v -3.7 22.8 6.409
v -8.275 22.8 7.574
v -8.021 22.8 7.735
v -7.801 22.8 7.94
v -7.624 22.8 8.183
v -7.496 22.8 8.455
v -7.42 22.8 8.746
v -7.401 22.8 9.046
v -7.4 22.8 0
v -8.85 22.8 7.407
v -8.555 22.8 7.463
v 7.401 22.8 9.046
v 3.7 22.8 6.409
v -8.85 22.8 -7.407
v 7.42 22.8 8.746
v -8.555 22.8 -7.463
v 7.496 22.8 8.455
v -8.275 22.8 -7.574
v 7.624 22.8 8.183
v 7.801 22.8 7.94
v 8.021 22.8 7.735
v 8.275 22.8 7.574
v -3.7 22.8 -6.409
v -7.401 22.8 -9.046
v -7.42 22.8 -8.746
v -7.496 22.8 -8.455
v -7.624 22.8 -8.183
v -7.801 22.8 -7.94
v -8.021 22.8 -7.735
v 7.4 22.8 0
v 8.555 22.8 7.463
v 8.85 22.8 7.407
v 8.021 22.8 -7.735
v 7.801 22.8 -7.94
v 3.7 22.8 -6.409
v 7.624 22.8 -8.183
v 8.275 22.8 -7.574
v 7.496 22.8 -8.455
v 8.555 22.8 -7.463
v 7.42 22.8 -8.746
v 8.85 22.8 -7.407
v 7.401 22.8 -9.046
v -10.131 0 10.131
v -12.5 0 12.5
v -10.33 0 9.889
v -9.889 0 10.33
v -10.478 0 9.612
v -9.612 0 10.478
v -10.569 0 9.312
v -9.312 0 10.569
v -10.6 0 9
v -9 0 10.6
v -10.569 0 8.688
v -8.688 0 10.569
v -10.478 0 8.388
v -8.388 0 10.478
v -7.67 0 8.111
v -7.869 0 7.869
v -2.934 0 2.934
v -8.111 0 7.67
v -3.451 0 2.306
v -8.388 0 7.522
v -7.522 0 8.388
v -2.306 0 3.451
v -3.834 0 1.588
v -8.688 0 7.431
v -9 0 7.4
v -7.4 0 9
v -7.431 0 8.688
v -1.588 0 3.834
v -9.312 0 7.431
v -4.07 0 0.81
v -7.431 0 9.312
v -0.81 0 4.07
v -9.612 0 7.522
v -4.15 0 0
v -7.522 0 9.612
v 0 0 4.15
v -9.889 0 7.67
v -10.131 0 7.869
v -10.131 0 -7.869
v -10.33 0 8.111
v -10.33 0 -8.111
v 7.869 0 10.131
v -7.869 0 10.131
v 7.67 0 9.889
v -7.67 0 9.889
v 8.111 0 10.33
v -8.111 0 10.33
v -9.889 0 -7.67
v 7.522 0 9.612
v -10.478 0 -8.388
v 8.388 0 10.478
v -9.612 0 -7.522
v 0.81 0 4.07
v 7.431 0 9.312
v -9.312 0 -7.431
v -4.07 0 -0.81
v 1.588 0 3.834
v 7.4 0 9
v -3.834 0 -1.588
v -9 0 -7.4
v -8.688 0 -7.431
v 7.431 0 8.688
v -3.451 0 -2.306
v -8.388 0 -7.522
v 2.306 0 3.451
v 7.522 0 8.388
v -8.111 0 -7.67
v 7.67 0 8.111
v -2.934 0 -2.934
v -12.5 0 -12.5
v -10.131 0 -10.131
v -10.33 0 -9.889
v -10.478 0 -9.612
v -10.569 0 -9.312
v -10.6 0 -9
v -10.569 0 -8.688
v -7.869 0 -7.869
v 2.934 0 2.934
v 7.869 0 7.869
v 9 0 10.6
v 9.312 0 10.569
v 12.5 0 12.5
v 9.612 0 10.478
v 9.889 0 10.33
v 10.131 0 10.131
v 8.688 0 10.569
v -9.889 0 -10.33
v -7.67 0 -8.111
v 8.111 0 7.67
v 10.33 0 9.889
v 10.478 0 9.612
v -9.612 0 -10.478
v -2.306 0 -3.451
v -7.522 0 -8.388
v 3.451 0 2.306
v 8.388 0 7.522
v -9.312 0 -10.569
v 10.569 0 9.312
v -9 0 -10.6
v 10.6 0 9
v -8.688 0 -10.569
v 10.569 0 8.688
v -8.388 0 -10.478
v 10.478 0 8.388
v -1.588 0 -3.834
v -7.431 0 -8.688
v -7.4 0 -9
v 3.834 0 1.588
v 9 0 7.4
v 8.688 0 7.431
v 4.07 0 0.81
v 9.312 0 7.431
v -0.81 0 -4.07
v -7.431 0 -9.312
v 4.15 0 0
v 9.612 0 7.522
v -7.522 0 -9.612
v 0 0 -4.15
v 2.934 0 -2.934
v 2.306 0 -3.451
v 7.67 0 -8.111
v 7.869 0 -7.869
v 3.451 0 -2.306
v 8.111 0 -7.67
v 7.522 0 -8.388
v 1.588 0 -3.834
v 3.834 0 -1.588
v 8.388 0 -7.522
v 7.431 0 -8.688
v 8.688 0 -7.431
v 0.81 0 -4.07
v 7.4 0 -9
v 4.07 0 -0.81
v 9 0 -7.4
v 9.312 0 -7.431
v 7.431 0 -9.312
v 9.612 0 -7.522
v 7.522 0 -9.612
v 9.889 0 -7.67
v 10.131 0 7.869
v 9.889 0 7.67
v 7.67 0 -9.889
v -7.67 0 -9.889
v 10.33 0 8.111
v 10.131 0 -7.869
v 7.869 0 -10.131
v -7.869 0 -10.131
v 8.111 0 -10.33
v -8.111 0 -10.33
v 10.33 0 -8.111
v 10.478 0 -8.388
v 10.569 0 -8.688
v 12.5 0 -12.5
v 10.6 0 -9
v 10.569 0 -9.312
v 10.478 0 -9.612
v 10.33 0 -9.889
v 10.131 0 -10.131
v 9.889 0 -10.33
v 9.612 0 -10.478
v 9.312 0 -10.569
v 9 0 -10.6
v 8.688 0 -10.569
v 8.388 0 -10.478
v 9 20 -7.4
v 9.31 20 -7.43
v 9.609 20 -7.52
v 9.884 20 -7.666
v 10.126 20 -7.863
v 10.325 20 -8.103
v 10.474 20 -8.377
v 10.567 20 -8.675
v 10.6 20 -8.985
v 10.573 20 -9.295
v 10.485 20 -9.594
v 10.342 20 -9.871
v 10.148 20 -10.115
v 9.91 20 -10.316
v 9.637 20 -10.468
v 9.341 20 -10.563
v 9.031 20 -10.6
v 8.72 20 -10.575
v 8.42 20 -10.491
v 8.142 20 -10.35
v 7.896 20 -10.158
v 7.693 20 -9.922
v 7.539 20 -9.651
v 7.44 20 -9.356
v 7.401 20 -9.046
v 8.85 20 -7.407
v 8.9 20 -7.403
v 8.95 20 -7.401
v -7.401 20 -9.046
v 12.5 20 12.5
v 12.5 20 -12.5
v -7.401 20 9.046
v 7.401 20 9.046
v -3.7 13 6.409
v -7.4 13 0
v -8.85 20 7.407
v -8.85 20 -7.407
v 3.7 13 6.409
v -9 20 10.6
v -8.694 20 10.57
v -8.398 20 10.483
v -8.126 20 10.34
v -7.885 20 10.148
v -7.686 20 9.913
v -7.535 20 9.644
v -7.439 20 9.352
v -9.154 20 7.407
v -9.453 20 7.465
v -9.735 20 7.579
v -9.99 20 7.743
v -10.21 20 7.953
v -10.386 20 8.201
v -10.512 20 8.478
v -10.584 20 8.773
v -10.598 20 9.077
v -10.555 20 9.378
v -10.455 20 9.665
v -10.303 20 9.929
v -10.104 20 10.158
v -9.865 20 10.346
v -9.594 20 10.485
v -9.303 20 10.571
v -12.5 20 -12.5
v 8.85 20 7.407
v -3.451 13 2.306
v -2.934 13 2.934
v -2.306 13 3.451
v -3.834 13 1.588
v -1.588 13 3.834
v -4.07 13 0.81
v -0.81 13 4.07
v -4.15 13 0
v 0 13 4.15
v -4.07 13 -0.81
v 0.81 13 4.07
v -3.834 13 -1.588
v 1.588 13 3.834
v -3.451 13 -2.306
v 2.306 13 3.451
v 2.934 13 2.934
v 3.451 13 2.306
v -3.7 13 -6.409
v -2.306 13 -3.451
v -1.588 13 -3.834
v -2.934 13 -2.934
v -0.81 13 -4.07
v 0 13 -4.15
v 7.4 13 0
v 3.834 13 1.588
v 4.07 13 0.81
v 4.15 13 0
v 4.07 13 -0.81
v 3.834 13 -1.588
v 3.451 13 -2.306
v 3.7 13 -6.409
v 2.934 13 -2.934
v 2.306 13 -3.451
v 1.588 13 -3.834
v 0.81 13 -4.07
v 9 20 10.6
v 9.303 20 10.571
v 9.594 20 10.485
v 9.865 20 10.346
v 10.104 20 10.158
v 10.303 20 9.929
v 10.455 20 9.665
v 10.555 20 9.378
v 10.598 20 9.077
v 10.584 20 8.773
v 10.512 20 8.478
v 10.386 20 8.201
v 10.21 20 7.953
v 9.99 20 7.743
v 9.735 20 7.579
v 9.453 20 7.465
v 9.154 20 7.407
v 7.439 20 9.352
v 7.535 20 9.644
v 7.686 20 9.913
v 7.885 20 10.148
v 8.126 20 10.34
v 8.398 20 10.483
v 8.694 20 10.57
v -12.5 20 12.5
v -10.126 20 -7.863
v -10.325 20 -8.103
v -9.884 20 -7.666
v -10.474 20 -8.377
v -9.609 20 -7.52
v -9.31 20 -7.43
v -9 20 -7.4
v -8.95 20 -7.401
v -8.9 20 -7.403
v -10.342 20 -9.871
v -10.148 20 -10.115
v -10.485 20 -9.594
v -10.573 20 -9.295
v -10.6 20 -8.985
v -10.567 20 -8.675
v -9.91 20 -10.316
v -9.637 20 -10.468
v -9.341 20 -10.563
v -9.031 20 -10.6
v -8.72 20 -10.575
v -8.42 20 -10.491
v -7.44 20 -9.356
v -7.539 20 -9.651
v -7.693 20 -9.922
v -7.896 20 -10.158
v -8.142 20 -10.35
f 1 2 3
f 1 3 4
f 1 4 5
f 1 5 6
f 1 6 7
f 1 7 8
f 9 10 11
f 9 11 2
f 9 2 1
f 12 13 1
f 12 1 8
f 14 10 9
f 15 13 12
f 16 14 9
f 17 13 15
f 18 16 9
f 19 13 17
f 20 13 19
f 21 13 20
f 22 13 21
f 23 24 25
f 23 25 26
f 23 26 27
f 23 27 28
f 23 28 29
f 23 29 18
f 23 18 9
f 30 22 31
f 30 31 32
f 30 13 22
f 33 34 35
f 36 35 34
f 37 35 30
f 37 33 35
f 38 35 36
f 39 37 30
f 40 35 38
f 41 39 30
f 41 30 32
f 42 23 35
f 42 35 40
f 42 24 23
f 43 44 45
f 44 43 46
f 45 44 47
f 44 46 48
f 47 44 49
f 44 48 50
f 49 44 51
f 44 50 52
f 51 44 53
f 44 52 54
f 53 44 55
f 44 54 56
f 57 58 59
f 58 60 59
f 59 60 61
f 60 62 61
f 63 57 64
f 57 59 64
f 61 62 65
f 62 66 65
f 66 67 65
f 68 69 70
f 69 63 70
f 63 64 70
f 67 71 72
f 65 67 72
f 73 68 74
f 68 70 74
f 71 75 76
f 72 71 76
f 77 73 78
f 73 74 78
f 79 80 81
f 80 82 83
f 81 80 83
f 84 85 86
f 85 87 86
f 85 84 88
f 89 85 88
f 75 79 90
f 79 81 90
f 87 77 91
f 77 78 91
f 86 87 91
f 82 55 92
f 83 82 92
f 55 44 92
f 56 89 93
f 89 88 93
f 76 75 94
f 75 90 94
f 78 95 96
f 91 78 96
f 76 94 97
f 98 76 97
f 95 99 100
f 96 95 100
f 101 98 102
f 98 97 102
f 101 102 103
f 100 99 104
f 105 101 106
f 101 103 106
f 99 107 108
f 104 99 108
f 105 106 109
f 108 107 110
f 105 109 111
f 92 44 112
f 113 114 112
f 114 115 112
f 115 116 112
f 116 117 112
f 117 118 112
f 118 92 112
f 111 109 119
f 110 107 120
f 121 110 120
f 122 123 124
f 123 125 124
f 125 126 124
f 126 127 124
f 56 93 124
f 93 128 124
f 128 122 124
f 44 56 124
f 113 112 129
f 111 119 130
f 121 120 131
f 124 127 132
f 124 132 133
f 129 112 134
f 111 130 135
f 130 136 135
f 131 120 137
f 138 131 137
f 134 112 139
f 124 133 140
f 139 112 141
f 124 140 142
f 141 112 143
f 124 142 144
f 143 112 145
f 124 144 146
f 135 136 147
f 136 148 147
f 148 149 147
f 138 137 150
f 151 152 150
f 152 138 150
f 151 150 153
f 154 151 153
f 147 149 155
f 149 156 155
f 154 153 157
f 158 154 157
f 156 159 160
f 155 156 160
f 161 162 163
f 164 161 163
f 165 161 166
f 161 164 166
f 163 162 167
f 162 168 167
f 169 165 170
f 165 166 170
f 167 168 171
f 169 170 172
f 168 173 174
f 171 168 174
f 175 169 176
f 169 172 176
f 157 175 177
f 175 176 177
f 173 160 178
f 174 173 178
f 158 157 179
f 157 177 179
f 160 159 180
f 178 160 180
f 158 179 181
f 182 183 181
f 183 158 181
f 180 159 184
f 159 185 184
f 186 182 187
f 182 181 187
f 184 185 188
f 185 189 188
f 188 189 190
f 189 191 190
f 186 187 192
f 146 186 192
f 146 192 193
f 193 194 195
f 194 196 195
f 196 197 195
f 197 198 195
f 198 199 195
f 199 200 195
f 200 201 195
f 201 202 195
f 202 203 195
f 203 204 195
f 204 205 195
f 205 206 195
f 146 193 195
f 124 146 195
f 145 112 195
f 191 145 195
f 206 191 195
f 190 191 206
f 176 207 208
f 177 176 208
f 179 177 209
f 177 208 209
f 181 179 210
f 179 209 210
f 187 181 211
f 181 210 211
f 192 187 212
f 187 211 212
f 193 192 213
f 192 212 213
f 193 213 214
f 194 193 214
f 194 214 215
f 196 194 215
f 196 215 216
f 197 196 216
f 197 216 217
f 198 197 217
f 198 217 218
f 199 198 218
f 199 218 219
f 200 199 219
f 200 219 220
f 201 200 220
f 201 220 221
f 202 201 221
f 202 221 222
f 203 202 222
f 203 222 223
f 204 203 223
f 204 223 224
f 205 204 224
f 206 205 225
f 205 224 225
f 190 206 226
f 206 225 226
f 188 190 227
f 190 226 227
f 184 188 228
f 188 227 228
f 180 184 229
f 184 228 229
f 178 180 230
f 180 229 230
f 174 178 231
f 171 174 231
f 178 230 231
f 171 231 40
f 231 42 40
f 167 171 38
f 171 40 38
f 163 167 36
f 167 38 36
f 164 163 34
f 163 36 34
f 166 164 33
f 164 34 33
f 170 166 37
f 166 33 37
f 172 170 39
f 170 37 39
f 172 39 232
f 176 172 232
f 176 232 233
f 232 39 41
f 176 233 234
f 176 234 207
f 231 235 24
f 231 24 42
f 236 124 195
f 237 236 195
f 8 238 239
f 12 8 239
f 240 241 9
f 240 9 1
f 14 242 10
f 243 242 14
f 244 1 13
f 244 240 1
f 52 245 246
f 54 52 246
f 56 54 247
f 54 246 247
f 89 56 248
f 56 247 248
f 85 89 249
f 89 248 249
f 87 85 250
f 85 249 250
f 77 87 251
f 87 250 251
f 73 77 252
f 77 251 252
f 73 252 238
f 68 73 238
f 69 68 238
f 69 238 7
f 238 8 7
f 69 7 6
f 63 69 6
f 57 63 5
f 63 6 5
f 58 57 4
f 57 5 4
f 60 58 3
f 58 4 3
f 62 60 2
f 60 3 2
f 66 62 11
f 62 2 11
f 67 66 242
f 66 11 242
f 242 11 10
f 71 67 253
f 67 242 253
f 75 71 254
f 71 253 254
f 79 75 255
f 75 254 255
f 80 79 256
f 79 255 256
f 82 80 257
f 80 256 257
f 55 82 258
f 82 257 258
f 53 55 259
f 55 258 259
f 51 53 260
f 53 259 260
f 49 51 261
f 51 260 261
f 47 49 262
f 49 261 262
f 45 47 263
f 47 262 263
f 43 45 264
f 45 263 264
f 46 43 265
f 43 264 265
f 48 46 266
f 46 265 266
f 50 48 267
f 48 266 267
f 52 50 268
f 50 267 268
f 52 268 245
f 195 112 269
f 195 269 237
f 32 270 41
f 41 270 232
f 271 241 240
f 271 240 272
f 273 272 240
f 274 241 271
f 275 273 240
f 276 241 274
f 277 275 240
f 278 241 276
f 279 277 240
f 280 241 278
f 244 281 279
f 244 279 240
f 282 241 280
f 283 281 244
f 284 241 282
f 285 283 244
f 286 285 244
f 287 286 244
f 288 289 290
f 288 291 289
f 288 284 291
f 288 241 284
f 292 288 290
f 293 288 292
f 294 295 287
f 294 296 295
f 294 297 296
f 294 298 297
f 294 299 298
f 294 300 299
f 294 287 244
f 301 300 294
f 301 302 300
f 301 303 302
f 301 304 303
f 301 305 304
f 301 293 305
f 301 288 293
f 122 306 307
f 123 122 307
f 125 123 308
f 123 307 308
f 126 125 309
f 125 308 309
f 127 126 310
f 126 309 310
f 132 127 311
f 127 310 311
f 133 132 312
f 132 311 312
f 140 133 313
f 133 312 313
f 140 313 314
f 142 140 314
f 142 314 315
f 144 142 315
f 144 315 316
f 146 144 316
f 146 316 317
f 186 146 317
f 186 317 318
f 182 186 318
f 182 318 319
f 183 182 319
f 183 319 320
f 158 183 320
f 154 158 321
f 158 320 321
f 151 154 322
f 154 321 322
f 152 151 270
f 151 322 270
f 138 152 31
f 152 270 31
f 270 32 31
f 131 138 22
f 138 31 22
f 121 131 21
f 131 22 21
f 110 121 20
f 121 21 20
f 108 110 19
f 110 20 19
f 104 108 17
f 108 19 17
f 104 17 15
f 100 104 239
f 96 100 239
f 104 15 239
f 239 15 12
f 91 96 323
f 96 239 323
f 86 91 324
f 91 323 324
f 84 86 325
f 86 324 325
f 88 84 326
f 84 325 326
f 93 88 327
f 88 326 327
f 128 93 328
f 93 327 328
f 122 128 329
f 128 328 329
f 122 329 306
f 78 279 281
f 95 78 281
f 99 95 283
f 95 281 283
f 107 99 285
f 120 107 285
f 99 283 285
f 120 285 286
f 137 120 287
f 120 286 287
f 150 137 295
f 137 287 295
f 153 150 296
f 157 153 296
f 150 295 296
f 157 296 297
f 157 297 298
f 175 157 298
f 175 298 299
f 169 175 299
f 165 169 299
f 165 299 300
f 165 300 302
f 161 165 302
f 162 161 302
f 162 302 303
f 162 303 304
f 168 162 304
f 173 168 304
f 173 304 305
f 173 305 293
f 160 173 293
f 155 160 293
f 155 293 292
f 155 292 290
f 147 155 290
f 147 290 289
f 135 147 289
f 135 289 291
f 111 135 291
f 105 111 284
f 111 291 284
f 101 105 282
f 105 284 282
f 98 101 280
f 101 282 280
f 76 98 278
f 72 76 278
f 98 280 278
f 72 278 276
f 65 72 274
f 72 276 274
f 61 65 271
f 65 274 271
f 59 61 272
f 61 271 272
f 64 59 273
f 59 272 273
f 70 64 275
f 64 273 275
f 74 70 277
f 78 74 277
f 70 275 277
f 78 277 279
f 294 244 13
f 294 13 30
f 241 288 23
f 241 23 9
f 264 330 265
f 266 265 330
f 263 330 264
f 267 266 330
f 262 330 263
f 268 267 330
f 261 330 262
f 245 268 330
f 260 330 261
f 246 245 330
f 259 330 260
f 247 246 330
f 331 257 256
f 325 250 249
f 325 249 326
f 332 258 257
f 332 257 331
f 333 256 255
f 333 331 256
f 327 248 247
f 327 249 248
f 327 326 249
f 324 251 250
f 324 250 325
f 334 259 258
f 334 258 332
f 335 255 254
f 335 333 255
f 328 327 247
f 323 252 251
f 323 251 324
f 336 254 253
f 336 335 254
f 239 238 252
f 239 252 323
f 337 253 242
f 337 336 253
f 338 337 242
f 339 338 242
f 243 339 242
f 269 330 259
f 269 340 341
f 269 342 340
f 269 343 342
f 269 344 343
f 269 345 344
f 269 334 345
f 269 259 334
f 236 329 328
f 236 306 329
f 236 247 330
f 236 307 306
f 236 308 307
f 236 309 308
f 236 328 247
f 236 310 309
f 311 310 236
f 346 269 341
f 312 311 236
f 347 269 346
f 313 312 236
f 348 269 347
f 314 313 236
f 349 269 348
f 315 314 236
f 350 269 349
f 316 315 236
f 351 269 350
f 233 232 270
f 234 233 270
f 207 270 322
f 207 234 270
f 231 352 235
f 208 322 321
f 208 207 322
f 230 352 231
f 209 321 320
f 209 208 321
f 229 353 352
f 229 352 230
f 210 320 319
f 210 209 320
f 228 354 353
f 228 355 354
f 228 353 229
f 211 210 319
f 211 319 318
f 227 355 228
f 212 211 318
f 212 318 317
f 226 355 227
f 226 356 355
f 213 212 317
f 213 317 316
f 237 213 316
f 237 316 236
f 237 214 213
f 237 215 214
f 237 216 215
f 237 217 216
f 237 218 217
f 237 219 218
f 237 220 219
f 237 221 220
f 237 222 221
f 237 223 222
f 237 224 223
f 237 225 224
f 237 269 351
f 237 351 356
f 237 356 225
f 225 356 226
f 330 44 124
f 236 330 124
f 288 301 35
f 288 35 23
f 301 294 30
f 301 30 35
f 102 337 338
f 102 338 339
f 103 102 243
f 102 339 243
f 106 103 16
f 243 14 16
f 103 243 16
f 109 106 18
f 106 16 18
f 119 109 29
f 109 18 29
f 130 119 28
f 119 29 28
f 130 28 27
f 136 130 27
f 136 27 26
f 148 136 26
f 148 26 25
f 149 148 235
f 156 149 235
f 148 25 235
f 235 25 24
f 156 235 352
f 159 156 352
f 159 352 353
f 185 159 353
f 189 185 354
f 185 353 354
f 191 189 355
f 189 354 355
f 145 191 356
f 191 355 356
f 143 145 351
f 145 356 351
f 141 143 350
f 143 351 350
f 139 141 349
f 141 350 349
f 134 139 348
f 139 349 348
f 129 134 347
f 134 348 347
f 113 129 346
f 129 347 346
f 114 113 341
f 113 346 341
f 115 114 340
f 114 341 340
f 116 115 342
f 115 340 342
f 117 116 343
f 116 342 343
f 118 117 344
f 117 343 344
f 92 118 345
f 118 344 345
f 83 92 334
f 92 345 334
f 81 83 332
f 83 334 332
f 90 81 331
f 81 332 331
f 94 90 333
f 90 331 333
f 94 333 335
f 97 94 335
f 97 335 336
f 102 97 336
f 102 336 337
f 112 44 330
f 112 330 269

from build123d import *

# Parameters (mm, degrees)
SKETCH1_W               = 25
SKETCH1_H               = 25
BOSS_EXTRUDE1_DEPTH     = 20
SKETCH4_R               = 4.15
CUT_EXTRUDE2_DEPTH      = 21
CUT_EXTRUDE3_DEPTH      = 7
SKETCH9_W               = 17.7
SKETCH9_H               = 18.092678694
BOSS_EXTRUDE3_DEPTH     = 2.8
SKETCH6_R               = 1.6
CUT_EXTRUDE4_DEPTH      = 3.8
CUT_EXTRUDE4_DEPTH_BACK = 21


with BuildPart() as part:
    # Sketch1 → Boss-Extrude1 (new body)
    with BuildSketch(Plane(origin=(0, 0, 0), x_dir=(1, 0, 0), z_dir=(0, 1, 0))):
        Rectangle(SKETCH1_W, SKETCH1_H)
    extrude(amount=BOSS_EXTRUDE1_DEPTH)

    # Sketch4 → Cut-Extrude2 (cut, through all)
    with BuildSketch(Plane(origin=(0, 20, 0), x_dir=(1, 0, 0), z_dir=(0, 1, 0))):
        with Locations(Location((0, 0, 0), (0, 0, 270))):  # turned: the seam where the file's is
            Circle(SKETCH4_R)
    extrude(amount=-CUT_EXTRUDE2_DEPTH, mode=Mode.SUBTRACT)

    # Sketch5 → Cut-Extrude3 (cut)
    with BuildSketch(Plane(origin=(0, 20, 0), x_dir=(1, 0, 0), z_dir=(0, 1, 0))):
        Polygon((-3.7, -6.408587988), (3.7, -6.408587988), (7.4, 0), (3.7, 6.408587988), (-3.7, 6.408587988), (-7.4, 0), align=None)
    extrude(amount=-CUT_EXTRUDE3_DEPTH, mode=Mode.SUBTRACT)

    # Sketch9 → Boss-Extrude3 (add)
    with BuildSketch(Plane(origin=(0, 20, 0), x_dir=(1, 0, 0), z_dir=(0, 1, 0))):
        Rectangle(SKETCH9_W, SKETCH9_H)
        Polygon((-3.7, -6.408587988), (3.7, -6.408587988), (7.4, 0), (3.7, 6.408587988), (-3.7, 6.408587988), (-7.4, 0), align=None, mode=Mode.SUBTRACT)
    extrude(amount=BOSS_EXTRUDE3_DEPTH)

    # Sketch6 → Cut-Extrude4 (cut, two sides)
    with BuildSketch(Plane(origin=(0, 20, 0), x_dir=(1, 0, 0), z_dir=(0, 1, 0))) as cut_extrude4_sk:
        with Locations(Location((9, -9, 0), (0, 0, 270))):  # turned: the seam where the file's is
            Circle(SKETCH6_R)
        with Locations(Location((-9, -9, 0), (0, 0, 270))):  # turned: the seam where the file's is
            Circle(SKETCH6_R)
        with Locations(Location((-9, 9, 0), (0, 0, 270))):  # turned: the seam where the file's is
            Circle(SKETCH6_R)
        with Locations(Location((9, 9, 0), (0, 0, 270))):  # turned: the seam where the file's is
            Circle(SKETCH6_R)
    extrude(amount=CUT_EXTRUDE4_DEPTH, mode=Mode.SUBTRACT)
    extrude(cut_extrude4_sk.sketch, amount=-CUT_EXTRUDE4_DEPTH_BACK, mode=Mode.SUBTRACT)


solid = part.part
